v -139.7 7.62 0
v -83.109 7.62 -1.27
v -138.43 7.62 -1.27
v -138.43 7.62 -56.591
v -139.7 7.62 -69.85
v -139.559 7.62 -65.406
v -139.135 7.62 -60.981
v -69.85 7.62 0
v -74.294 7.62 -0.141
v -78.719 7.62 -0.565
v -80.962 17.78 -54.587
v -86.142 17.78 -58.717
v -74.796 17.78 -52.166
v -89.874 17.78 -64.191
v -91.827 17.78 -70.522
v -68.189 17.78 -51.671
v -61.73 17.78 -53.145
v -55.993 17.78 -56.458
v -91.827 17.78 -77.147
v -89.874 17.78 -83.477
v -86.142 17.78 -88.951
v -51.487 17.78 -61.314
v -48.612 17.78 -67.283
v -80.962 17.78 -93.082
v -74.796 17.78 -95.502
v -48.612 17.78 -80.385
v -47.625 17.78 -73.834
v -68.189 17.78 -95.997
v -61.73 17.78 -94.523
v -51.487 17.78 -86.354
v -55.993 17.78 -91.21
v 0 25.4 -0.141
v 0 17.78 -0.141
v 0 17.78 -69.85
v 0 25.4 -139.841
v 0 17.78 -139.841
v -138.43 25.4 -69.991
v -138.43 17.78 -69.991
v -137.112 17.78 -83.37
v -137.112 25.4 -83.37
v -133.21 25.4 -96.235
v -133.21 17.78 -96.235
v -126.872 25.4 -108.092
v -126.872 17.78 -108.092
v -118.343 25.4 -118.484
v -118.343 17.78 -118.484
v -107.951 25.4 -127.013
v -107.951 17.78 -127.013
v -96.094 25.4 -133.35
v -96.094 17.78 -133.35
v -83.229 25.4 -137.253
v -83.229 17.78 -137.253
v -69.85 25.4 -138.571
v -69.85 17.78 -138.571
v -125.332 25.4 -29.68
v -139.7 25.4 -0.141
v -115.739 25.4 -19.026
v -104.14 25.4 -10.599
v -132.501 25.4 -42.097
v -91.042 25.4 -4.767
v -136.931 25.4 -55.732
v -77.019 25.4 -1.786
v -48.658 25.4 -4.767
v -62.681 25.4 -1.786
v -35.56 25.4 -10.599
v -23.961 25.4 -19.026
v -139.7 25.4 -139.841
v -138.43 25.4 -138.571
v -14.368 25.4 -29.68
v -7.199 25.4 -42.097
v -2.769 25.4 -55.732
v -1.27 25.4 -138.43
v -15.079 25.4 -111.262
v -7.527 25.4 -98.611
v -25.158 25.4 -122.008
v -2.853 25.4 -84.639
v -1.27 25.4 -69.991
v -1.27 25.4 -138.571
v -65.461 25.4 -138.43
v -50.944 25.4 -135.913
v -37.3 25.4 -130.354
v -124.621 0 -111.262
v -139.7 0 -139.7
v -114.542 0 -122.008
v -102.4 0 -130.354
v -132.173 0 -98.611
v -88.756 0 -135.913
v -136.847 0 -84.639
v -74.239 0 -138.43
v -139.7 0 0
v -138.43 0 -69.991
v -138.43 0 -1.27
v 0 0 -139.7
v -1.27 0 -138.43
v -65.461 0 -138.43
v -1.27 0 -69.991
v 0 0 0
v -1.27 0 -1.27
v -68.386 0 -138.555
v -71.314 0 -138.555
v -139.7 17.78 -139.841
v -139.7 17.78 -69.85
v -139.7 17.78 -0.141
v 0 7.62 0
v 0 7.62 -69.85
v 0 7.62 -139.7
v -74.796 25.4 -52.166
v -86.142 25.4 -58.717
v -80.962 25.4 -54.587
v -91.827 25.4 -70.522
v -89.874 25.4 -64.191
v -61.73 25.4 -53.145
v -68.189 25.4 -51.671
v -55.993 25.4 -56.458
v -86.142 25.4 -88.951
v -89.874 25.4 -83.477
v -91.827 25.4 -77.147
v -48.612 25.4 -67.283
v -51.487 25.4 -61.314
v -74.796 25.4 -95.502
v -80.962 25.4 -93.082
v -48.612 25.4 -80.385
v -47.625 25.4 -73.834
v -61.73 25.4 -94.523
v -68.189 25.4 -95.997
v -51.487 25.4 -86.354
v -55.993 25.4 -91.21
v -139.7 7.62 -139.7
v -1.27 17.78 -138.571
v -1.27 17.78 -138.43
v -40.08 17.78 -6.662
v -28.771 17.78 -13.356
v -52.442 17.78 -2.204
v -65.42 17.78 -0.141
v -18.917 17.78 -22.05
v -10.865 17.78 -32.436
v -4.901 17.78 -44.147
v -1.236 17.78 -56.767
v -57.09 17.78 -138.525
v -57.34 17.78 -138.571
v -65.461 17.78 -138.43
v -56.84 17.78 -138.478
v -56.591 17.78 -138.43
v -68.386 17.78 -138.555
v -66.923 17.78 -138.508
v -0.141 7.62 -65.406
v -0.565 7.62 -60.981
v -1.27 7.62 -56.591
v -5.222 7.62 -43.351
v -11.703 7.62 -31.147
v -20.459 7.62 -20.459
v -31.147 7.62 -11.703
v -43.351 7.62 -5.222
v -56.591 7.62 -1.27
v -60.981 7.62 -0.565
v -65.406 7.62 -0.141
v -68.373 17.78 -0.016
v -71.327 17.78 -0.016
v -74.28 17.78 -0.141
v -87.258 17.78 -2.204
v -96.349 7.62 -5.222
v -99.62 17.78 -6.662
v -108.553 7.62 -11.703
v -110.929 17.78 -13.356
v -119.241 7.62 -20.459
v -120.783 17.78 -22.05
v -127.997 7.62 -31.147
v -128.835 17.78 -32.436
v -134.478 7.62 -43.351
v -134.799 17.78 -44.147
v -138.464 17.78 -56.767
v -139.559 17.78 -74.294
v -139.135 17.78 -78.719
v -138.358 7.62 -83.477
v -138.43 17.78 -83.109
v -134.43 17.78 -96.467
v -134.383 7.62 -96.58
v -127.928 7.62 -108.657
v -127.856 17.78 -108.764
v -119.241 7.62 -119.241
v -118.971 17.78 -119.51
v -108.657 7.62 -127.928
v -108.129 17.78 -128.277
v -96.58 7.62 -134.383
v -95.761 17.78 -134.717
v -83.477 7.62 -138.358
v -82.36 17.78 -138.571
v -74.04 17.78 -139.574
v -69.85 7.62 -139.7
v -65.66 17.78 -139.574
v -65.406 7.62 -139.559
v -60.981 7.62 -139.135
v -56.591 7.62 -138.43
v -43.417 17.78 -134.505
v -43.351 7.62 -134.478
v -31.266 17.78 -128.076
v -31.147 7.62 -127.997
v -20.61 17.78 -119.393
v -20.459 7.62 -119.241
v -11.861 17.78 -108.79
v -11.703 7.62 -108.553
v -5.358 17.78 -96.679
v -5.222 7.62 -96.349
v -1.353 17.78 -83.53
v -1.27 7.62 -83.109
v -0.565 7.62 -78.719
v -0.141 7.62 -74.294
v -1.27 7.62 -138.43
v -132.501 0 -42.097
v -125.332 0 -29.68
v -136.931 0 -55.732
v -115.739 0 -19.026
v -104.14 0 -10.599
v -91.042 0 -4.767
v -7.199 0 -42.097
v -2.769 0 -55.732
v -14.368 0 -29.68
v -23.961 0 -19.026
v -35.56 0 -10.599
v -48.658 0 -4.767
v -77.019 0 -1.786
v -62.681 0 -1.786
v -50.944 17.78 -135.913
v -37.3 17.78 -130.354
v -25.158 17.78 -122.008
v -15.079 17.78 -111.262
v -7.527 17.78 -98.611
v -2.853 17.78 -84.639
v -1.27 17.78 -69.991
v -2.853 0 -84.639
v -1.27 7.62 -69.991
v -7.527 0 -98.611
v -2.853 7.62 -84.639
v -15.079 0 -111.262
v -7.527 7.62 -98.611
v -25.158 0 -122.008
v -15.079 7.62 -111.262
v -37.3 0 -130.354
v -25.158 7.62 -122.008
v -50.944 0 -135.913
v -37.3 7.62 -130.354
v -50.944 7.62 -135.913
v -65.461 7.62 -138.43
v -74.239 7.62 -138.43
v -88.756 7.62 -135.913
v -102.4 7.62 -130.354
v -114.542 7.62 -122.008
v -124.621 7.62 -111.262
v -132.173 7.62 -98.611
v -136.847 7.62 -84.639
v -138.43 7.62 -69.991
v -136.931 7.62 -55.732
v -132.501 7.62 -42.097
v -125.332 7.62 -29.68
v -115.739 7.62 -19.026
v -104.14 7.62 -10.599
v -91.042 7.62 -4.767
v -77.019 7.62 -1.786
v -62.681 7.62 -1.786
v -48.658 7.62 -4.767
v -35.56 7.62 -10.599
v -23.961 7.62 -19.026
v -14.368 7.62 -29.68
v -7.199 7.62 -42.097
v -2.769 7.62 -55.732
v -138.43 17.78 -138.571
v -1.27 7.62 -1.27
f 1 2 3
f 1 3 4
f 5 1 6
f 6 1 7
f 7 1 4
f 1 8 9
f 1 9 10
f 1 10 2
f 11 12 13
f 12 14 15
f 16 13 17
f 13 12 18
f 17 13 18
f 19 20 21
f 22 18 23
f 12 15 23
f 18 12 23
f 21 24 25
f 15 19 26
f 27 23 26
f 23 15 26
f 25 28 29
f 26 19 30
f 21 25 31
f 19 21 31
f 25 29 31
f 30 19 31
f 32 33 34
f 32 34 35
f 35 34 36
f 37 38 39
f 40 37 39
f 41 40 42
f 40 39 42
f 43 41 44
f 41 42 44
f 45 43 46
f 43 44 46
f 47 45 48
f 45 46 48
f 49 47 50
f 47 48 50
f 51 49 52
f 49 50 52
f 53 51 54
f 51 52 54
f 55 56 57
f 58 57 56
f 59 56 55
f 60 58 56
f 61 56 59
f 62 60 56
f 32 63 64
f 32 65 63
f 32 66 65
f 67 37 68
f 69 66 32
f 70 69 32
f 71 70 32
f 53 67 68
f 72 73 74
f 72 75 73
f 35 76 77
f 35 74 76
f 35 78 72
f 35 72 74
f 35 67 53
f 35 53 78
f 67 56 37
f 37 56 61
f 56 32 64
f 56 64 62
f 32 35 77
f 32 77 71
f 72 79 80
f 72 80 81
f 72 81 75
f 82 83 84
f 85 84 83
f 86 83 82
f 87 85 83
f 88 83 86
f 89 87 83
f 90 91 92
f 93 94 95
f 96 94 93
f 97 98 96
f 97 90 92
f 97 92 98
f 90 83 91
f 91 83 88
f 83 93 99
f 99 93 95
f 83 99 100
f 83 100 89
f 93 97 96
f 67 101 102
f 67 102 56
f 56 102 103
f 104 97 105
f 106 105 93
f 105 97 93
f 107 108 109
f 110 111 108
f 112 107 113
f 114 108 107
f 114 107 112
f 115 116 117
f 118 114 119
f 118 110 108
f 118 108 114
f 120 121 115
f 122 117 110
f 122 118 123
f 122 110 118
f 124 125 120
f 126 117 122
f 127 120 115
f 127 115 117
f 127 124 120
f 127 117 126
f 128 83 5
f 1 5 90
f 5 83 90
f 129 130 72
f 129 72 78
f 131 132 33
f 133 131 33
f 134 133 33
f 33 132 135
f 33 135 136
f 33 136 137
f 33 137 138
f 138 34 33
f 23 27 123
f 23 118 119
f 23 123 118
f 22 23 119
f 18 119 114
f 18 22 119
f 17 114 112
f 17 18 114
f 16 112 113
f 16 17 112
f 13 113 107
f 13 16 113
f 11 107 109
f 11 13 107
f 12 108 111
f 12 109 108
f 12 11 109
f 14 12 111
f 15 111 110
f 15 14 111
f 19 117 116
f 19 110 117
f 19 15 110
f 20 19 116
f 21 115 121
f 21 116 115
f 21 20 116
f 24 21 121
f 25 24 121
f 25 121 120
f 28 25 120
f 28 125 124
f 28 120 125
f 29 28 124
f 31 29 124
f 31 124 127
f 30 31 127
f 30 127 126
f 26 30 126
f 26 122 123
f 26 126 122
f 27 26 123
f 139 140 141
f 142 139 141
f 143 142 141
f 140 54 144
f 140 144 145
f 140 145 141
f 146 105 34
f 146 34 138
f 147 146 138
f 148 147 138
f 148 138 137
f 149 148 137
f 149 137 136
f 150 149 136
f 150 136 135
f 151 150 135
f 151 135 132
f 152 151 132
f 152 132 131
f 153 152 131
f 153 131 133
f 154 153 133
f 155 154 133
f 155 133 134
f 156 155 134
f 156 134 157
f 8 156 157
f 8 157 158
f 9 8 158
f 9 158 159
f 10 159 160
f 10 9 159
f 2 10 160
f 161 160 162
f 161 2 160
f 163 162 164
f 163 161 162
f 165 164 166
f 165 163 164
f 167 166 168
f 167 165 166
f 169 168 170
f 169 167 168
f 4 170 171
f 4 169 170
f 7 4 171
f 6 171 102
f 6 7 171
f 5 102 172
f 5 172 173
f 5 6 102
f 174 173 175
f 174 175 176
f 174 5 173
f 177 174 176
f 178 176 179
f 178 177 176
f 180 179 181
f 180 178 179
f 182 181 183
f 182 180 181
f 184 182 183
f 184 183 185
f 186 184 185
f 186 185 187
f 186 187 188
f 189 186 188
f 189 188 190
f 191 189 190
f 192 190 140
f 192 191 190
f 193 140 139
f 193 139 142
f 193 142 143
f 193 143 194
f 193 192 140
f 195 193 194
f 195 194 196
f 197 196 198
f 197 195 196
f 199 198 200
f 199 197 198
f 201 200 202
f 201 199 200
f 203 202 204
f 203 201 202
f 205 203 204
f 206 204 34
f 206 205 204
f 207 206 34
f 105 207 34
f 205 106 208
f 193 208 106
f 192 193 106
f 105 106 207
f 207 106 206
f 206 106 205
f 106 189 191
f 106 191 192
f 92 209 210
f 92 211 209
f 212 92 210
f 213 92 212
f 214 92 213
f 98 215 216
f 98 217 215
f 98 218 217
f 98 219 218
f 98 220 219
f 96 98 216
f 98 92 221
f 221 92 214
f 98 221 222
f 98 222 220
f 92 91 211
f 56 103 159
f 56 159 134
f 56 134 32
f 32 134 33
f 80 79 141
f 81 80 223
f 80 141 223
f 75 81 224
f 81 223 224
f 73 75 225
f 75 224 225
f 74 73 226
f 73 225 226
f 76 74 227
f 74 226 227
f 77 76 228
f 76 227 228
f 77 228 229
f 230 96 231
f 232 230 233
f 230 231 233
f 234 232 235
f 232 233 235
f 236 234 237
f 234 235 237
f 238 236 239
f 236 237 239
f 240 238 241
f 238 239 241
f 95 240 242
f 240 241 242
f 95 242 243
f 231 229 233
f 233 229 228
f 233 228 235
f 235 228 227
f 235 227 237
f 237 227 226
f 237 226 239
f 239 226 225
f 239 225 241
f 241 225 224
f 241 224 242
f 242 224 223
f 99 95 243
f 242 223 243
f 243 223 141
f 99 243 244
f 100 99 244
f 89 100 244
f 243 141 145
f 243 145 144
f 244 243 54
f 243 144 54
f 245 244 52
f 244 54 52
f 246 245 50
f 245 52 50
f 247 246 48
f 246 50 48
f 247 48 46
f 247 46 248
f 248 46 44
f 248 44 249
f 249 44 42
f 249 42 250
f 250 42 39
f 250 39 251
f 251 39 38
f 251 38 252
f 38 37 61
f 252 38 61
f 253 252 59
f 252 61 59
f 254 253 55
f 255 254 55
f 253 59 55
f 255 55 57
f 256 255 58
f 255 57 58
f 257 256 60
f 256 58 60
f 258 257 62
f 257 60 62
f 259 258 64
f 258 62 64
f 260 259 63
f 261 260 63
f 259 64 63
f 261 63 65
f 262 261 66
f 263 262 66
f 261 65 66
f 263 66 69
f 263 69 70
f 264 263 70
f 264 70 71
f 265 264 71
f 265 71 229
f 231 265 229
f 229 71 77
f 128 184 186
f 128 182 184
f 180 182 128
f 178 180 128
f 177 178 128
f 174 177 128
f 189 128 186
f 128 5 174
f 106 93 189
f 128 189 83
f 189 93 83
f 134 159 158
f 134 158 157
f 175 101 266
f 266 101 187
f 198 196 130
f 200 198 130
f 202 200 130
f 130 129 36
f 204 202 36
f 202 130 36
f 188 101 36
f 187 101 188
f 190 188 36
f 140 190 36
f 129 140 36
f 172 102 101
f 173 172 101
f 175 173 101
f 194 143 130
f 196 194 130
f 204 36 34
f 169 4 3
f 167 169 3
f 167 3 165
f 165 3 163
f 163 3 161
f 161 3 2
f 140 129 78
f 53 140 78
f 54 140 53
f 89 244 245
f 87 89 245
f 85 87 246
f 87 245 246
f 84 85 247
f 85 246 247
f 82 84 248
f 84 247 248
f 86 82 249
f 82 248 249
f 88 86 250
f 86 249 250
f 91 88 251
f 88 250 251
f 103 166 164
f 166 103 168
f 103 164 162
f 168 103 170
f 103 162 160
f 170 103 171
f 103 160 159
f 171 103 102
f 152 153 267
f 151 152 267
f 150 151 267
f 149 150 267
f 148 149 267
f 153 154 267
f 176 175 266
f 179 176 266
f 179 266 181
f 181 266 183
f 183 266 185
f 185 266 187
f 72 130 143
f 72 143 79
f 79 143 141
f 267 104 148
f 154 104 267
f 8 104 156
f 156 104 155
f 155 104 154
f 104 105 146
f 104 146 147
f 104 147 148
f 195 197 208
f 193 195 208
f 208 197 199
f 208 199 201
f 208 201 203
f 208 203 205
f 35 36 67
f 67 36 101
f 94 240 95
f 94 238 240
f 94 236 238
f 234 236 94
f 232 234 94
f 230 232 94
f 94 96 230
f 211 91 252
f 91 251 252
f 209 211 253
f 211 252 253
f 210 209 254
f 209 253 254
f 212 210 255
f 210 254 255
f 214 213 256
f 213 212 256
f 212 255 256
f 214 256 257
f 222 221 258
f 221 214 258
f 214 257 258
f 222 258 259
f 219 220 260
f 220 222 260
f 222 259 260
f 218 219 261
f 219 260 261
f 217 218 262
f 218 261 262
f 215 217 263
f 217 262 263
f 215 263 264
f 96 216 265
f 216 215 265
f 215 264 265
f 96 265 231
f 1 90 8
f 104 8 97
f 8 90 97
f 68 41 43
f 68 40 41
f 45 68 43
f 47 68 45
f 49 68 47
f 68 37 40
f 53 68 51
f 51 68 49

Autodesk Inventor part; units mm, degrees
ref_plane "YZ Plane" through (0, 0, 0) normal (1, 0, 0) x (0, 1, 0)
ref_plane "XZ Plane" through (0, 0, 0) normal (0, 1, 0) x (-1, 0, 0)
ref_plane "XY Plane" through (0, 0, 0) normal (0, 0, 1) x (1, 0, 0)
sketch "Sketch1" plane through (0, 0, 0) normal (0, 1, 0) x (-1, 0, 0)
  line L0 (0, 0) -> (0, -139.7)
  line L1 (0, -139.7) -> (139.7, -139.7)
  line L2 (139.7, -139.7) -> (139.7, 0)
  line L3 (139.7, 0) -> (0, 0)
  dimension "d0" = 139.7
  dimension "d1" = 139.7
  dimension "d2" = 139.7
extrude "Extrusion1" add sketch "Sketch1" along normal blind 7.62
sketch "Sketch2" plane through (0, 7.62, 0) normal (0, 1, 0) x (1, 0, 0)
  line L0 (-138.43, 1.27) -> (-1.27, 1.27)
  line L1 (-1.27, 1.27) -> (-1.27, 138.43)
  line L2 (-1.27, 138.43) -> (-138.43, 138.43)
  line L3 (-138.43, 138.43) -> (-138.43, 1.27)
  line L4 (-139.7, 0) -> (0, 0) projected
  line L5 (0, 0) -> (0, 139.7) projected
  dimension "d5" = 137.16
  dimension "d6" = 137.16
  dimension "d7" = 1.27
  dimension "d8" = 1.27
extrude "Extrusion2" cut sketch "Sketch2" against normal blind 25.4
sketch "Sketch3" plane through (0, 7.62, 0) normal (0, 1, 0) x (1, 0, 0)
  circle A0 centre (-69.85, 69.85) radius 69.85
  line L0 (-139.7, 0) -> (0, 0) projected
  line L1 (-139.7, 139.7) -> (-139.7, 0) projected
  dimension "d11" = 139.7
  dimension "d12" = 69.85
  dimension "d13" = 69.85
extrude "Extrusion3" add sketch "Sketch3" along normal blind 10.16 contours A0
sketch "Sketch4" plane through (-69.85, 17.78, -69.85) normal (0, 1, 0) x (1, 0, 0)
  line L0 (-69.85, -69.7094) -> (69.85, -69.7094)
  line L1 (69.85, -69.7094) -> (69.85, 69.9906)
  line L2 (69.85, 69.9906) -> (-69.85, 69.9906)
  line L3 (-69.85, 69.9906) -> (-69.85, -69.7094)
  line L4 (-68.58, -68.4394) -> (68.58, -68.4394)
  line L5 (68.58, -68.4394) -> (68.58, 68.7206)
  line L6 (68.58, 68.7206) -> (-68.58, 68.7206)
  line L7 (-68.58, 68.7206) -> (-68.58, -68.4394)
  point P0 (69.85, -69.85)
  dimension "d16" = 139.7
  dimension "d17" = 139.7
  dimension "d18" = 137.16
  dimension "d19" = 137.16
  dimension "d20" = 1.27
  dimension "d21" = 1.27
extrude "Extrusion4" add sketch "Sketch4" along normal blind 7.62
sketch "Sketch5" plane through (0, 17.78, 0) normal (0, 1, 0) x (1, 0, 0)
  circle A0 centre (-69.85, 69.9906) radius 68.58
  line L0 (0, 0.1406) -> (0, 139.8406) projected
  line L1 (0, 139.8406) -> (-139.7, 139.8406) projected
  point P0 (0, 0)
  dimension "d24" = 137.16
  dimension "d25" = 69.85
  dimension "d26" = 69.85
extrude "Extrusion5" cut sketch "Sketch5" against normal blind 25.4
sketch "Sketch6" plane through (0, 17.78, 0) normal (0, 1, 0) x (1, 0, 0)
  circle A0 centre (-69.85, 73.8341) radius 22.225
  line L0 (-139.7, 139.8406) -> (-139.7, 0.1406) projected
  point P0 (0, 0)
  dimension "d29" = 44.45
  dimension "d30" = 69.85
extrude "Extrusion6" add sketch "Sketch6" along normal blind 7.62
sketch "Sketch7" plane through (0, 7.62, 0) normal (0, -1, 0) x (1, 0, 0)
  line L0 (-74.2391, -138.43) -> (-138.43, -138.43) projected
  line L1 (-138.43, -138.43) -> (-138.43, -1.27) projected
  arc A0 (-138.43, -69.9906) -> (-74.2391, -138.43) centre (-69.85, -69.9906) ccw projected
  point P0 (0, 0)
extrude "Extrusion7" add sketch "Sketch7" along normal blind 7.62
sketch "Sketch8" plane through (0, 17.78, 0) normal (0, 1, 0) x (1, 0, 0)
  arc A0 (-138.43, 69.9906) -> (-1.27, 69.9906) centre (-69.85, 69.9906) ccw projected
  line L0 (-138.43, 69.9906) -> (-138.43, 1.27) projected
  line L1 (-138.43, 1.27) -> (-1.27, 1.27) projected
  arc A1 (-1.27, 69.9906) -> (-65.4609, 138.43) centre (-69.85, 69.9906) ccw projected
  line L2 (-1.27, 138.43) -> (-65.4609, 138.43) projected
  line L3 (-1.27, 1.27) -> (-1.27, 138.43) projected
  point P0 (0, 0)
extrude "Extrusion8" add sketch "Sketch8" along normal blind 7.62
sketch "Sketch9" plane through (0, 17.78, 0) normal (0, 1, 0) x (1, 0, 0)
  arc A0 (-69.85, 138.5706) -> (-138.43, 69.9906) centre (-69.85, 69.9906) ccw projected
  line L0 (-138.43, 69.9906) -> (-138.43, 138.5706) projected
  line L1 (-138.43, 138.5706) -> (-1.27, 138.5706) projected
  point P0 (0, 0)
extrude "Extrusion9" add sketch "Sketch9" along normal blind 7.62
sketch "Sketch10" plane through (0, 7.62, 0) normal (0, -1, 0) x (1, 0, 0)
  arc A0 (-1.27, -69.9906) -> (-138.43, -69.9906) centre (-69.85, -69.9906) ccw projected
  line L0 (-138.43, -1.27) -> (-1.27, -1.27) projected
  line L1 (-1.27, -1.27) -> (-1.27, -138.43) projected
  arc A1 (-138.43, -69.9906) -> (-65.4609, -138.43) centre (-69.85, -69.9906) ccw projected
  arc A2 (-65.4609, -138.43) -> (-1.27, -69.9906) centre (-69.85, -69.9906) ccw projected
  line L2 (-1.27, -138.43) -> (-65.4609, -138.43) projected
  line L3 (-138.43, -69.9906) -> (-138.43, -1.27) projected
  point P0 (0, 0)
extrude "Extrusion10" add sketch "Sketch10" along normal blind 7.62 contours A0 L3 L0 L1 | L1 L2 A2
sketch "Sketch11" plane through (-69.85, 25.4, -69.85) normal (0, 1, 0) x (1, 0, 0)
  point P0 (69.85, -69.85)
sketch "Sketch12" plane through (-69.85, 25.4, -73.8341) normal (0, 1, 0) x (1, 0, 0)
  point P0 (69.85, -73.8341)
sketch "Sketch13" plane through (-69.85, 25.4, -73.8341) normal (0, 1, 0) x (1, 0, 0)
  circle A0 centre (0, 0) radius 22.225 projected
  line L0 (-22.225, 0) -> (-53.9134, -46.2286)
  line L1 (-19.8453, -10.0057) -> (-48.9888, -52.5219)
  line L2 (22.225, 0) -> (50.003, 43.3412)
  line L3 (19.7307, 10.2298) -> (43.7736, 47.7431)
  line L4 (0, -22.225) -> (26.4575, -67.3455)
  line L5 (7.9672, -20.7479) -> (33.5583, -64.3906)
  line L6 (0, 22.225) -> (-22.6143, 60.3325)
  line L7 (-9.2826, 20.1937) -> (-31.2674, 57.6865)
  arc A1 (0, 64.7364) -> (4.3891, 64.5959) centre (0, -3.8436) ccw projected
  point P0 (69.85, -73.8341)
  dimension "d41" = 7.62
  dimension "d42" = 7.62
  dimension "d43" = 43.4631
  dimension "d44" = 44.3124
  dimension "d45" = 44.5568
  dimension "d46" = 0.3
  dimension "d47" = 7.62
properties part number "fan shell"
